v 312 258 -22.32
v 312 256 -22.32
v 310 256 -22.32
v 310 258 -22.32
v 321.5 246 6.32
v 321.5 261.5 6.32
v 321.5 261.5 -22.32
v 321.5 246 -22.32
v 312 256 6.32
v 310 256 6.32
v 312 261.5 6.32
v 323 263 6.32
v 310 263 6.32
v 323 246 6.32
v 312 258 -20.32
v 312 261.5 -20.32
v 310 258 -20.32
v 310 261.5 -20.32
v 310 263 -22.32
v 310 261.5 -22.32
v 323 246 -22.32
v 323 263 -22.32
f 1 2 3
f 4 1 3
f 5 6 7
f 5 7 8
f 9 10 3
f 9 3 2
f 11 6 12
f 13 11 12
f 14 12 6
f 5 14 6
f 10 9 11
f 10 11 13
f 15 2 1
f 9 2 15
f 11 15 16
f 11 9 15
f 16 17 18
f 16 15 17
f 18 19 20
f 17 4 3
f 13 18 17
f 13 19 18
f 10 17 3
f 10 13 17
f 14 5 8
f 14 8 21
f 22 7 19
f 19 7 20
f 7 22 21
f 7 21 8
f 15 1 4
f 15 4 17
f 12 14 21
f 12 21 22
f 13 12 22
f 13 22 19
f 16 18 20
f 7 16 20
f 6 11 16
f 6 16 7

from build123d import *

# Parameters (mm, degrees)
SKETCH068_W      = 3.5
SKETCH068_H      = 3
EXTRUDE058_DEPTH = 1
EXTRUDE057_DEPTH = 28.64


with BuildPart() as extrude058:
    # Sketch068 → Extrude058 (new body, symmetric)
    with BuildSketch(Plane.YZ.offset(311)):
        with Locations((259.75, -21.82)):
            Rectangle(SKETCH068_W, SKETCH068_H)
    extrude(amount=EXTRUDE058_DEPTH, both=True)


with BuildPart() as cut005:
    # Sketch067 → Extrude057 (new body)
    with BuildSketch(Plane(origin=(0, 0, 6.32), x_dir=(1, 0, 0), z_dir=(0, 0, -1))):
        Polygon((321.5, -246), (323, -246), (323, -263), (310, -263), (310, -256), (312, -256), (312, -261.5), (321.5, -261.5), align=None)
    extrude(amount=EXTRUDE057_DEPTH)

    # Cut005: cut Extrude058
    add(extrude058.part, mode=Mode.SUBTRACT)


solid = cut005.part
